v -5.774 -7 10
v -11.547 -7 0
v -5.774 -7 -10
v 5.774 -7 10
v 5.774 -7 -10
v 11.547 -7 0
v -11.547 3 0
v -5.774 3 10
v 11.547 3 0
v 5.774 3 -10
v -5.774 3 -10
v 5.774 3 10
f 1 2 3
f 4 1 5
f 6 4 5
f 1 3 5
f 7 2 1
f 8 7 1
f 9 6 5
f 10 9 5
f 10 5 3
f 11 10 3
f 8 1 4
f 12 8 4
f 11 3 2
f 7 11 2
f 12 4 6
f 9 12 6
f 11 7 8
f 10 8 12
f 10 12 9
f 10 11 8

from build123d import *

# Parameters (mm, degrees)
BOSS_EXTRUDE1_DEPTH      = 3
BOSS_EXTRUDE1_DEPTH_BACK = 7


with BuildPart() as part:
    # Sketch1 → Boss-Extrude1 (new, two sides: drawn at the far end of the back side and taken through both)
    with BuildSketch(Plane(origin=(0, 0, 0), x_dir=(1, 0, 0), z_dir=(0, 1, 0)).offset(-BOSS_EXTRUDE1_DEPTH_BACK)):
        Polygon((-5.773502692, -10), (5.773502692, -10), (11.547005384, 0), (5.773502692, 10), (-5.773502692, 10), (-11.547005384, 0), align=None)
    extrude(amount=BOSS_EXTRUDE1_DEPTH + BOSS_EXTRUDE1_DEPTH_BACK)


solid = part.part
